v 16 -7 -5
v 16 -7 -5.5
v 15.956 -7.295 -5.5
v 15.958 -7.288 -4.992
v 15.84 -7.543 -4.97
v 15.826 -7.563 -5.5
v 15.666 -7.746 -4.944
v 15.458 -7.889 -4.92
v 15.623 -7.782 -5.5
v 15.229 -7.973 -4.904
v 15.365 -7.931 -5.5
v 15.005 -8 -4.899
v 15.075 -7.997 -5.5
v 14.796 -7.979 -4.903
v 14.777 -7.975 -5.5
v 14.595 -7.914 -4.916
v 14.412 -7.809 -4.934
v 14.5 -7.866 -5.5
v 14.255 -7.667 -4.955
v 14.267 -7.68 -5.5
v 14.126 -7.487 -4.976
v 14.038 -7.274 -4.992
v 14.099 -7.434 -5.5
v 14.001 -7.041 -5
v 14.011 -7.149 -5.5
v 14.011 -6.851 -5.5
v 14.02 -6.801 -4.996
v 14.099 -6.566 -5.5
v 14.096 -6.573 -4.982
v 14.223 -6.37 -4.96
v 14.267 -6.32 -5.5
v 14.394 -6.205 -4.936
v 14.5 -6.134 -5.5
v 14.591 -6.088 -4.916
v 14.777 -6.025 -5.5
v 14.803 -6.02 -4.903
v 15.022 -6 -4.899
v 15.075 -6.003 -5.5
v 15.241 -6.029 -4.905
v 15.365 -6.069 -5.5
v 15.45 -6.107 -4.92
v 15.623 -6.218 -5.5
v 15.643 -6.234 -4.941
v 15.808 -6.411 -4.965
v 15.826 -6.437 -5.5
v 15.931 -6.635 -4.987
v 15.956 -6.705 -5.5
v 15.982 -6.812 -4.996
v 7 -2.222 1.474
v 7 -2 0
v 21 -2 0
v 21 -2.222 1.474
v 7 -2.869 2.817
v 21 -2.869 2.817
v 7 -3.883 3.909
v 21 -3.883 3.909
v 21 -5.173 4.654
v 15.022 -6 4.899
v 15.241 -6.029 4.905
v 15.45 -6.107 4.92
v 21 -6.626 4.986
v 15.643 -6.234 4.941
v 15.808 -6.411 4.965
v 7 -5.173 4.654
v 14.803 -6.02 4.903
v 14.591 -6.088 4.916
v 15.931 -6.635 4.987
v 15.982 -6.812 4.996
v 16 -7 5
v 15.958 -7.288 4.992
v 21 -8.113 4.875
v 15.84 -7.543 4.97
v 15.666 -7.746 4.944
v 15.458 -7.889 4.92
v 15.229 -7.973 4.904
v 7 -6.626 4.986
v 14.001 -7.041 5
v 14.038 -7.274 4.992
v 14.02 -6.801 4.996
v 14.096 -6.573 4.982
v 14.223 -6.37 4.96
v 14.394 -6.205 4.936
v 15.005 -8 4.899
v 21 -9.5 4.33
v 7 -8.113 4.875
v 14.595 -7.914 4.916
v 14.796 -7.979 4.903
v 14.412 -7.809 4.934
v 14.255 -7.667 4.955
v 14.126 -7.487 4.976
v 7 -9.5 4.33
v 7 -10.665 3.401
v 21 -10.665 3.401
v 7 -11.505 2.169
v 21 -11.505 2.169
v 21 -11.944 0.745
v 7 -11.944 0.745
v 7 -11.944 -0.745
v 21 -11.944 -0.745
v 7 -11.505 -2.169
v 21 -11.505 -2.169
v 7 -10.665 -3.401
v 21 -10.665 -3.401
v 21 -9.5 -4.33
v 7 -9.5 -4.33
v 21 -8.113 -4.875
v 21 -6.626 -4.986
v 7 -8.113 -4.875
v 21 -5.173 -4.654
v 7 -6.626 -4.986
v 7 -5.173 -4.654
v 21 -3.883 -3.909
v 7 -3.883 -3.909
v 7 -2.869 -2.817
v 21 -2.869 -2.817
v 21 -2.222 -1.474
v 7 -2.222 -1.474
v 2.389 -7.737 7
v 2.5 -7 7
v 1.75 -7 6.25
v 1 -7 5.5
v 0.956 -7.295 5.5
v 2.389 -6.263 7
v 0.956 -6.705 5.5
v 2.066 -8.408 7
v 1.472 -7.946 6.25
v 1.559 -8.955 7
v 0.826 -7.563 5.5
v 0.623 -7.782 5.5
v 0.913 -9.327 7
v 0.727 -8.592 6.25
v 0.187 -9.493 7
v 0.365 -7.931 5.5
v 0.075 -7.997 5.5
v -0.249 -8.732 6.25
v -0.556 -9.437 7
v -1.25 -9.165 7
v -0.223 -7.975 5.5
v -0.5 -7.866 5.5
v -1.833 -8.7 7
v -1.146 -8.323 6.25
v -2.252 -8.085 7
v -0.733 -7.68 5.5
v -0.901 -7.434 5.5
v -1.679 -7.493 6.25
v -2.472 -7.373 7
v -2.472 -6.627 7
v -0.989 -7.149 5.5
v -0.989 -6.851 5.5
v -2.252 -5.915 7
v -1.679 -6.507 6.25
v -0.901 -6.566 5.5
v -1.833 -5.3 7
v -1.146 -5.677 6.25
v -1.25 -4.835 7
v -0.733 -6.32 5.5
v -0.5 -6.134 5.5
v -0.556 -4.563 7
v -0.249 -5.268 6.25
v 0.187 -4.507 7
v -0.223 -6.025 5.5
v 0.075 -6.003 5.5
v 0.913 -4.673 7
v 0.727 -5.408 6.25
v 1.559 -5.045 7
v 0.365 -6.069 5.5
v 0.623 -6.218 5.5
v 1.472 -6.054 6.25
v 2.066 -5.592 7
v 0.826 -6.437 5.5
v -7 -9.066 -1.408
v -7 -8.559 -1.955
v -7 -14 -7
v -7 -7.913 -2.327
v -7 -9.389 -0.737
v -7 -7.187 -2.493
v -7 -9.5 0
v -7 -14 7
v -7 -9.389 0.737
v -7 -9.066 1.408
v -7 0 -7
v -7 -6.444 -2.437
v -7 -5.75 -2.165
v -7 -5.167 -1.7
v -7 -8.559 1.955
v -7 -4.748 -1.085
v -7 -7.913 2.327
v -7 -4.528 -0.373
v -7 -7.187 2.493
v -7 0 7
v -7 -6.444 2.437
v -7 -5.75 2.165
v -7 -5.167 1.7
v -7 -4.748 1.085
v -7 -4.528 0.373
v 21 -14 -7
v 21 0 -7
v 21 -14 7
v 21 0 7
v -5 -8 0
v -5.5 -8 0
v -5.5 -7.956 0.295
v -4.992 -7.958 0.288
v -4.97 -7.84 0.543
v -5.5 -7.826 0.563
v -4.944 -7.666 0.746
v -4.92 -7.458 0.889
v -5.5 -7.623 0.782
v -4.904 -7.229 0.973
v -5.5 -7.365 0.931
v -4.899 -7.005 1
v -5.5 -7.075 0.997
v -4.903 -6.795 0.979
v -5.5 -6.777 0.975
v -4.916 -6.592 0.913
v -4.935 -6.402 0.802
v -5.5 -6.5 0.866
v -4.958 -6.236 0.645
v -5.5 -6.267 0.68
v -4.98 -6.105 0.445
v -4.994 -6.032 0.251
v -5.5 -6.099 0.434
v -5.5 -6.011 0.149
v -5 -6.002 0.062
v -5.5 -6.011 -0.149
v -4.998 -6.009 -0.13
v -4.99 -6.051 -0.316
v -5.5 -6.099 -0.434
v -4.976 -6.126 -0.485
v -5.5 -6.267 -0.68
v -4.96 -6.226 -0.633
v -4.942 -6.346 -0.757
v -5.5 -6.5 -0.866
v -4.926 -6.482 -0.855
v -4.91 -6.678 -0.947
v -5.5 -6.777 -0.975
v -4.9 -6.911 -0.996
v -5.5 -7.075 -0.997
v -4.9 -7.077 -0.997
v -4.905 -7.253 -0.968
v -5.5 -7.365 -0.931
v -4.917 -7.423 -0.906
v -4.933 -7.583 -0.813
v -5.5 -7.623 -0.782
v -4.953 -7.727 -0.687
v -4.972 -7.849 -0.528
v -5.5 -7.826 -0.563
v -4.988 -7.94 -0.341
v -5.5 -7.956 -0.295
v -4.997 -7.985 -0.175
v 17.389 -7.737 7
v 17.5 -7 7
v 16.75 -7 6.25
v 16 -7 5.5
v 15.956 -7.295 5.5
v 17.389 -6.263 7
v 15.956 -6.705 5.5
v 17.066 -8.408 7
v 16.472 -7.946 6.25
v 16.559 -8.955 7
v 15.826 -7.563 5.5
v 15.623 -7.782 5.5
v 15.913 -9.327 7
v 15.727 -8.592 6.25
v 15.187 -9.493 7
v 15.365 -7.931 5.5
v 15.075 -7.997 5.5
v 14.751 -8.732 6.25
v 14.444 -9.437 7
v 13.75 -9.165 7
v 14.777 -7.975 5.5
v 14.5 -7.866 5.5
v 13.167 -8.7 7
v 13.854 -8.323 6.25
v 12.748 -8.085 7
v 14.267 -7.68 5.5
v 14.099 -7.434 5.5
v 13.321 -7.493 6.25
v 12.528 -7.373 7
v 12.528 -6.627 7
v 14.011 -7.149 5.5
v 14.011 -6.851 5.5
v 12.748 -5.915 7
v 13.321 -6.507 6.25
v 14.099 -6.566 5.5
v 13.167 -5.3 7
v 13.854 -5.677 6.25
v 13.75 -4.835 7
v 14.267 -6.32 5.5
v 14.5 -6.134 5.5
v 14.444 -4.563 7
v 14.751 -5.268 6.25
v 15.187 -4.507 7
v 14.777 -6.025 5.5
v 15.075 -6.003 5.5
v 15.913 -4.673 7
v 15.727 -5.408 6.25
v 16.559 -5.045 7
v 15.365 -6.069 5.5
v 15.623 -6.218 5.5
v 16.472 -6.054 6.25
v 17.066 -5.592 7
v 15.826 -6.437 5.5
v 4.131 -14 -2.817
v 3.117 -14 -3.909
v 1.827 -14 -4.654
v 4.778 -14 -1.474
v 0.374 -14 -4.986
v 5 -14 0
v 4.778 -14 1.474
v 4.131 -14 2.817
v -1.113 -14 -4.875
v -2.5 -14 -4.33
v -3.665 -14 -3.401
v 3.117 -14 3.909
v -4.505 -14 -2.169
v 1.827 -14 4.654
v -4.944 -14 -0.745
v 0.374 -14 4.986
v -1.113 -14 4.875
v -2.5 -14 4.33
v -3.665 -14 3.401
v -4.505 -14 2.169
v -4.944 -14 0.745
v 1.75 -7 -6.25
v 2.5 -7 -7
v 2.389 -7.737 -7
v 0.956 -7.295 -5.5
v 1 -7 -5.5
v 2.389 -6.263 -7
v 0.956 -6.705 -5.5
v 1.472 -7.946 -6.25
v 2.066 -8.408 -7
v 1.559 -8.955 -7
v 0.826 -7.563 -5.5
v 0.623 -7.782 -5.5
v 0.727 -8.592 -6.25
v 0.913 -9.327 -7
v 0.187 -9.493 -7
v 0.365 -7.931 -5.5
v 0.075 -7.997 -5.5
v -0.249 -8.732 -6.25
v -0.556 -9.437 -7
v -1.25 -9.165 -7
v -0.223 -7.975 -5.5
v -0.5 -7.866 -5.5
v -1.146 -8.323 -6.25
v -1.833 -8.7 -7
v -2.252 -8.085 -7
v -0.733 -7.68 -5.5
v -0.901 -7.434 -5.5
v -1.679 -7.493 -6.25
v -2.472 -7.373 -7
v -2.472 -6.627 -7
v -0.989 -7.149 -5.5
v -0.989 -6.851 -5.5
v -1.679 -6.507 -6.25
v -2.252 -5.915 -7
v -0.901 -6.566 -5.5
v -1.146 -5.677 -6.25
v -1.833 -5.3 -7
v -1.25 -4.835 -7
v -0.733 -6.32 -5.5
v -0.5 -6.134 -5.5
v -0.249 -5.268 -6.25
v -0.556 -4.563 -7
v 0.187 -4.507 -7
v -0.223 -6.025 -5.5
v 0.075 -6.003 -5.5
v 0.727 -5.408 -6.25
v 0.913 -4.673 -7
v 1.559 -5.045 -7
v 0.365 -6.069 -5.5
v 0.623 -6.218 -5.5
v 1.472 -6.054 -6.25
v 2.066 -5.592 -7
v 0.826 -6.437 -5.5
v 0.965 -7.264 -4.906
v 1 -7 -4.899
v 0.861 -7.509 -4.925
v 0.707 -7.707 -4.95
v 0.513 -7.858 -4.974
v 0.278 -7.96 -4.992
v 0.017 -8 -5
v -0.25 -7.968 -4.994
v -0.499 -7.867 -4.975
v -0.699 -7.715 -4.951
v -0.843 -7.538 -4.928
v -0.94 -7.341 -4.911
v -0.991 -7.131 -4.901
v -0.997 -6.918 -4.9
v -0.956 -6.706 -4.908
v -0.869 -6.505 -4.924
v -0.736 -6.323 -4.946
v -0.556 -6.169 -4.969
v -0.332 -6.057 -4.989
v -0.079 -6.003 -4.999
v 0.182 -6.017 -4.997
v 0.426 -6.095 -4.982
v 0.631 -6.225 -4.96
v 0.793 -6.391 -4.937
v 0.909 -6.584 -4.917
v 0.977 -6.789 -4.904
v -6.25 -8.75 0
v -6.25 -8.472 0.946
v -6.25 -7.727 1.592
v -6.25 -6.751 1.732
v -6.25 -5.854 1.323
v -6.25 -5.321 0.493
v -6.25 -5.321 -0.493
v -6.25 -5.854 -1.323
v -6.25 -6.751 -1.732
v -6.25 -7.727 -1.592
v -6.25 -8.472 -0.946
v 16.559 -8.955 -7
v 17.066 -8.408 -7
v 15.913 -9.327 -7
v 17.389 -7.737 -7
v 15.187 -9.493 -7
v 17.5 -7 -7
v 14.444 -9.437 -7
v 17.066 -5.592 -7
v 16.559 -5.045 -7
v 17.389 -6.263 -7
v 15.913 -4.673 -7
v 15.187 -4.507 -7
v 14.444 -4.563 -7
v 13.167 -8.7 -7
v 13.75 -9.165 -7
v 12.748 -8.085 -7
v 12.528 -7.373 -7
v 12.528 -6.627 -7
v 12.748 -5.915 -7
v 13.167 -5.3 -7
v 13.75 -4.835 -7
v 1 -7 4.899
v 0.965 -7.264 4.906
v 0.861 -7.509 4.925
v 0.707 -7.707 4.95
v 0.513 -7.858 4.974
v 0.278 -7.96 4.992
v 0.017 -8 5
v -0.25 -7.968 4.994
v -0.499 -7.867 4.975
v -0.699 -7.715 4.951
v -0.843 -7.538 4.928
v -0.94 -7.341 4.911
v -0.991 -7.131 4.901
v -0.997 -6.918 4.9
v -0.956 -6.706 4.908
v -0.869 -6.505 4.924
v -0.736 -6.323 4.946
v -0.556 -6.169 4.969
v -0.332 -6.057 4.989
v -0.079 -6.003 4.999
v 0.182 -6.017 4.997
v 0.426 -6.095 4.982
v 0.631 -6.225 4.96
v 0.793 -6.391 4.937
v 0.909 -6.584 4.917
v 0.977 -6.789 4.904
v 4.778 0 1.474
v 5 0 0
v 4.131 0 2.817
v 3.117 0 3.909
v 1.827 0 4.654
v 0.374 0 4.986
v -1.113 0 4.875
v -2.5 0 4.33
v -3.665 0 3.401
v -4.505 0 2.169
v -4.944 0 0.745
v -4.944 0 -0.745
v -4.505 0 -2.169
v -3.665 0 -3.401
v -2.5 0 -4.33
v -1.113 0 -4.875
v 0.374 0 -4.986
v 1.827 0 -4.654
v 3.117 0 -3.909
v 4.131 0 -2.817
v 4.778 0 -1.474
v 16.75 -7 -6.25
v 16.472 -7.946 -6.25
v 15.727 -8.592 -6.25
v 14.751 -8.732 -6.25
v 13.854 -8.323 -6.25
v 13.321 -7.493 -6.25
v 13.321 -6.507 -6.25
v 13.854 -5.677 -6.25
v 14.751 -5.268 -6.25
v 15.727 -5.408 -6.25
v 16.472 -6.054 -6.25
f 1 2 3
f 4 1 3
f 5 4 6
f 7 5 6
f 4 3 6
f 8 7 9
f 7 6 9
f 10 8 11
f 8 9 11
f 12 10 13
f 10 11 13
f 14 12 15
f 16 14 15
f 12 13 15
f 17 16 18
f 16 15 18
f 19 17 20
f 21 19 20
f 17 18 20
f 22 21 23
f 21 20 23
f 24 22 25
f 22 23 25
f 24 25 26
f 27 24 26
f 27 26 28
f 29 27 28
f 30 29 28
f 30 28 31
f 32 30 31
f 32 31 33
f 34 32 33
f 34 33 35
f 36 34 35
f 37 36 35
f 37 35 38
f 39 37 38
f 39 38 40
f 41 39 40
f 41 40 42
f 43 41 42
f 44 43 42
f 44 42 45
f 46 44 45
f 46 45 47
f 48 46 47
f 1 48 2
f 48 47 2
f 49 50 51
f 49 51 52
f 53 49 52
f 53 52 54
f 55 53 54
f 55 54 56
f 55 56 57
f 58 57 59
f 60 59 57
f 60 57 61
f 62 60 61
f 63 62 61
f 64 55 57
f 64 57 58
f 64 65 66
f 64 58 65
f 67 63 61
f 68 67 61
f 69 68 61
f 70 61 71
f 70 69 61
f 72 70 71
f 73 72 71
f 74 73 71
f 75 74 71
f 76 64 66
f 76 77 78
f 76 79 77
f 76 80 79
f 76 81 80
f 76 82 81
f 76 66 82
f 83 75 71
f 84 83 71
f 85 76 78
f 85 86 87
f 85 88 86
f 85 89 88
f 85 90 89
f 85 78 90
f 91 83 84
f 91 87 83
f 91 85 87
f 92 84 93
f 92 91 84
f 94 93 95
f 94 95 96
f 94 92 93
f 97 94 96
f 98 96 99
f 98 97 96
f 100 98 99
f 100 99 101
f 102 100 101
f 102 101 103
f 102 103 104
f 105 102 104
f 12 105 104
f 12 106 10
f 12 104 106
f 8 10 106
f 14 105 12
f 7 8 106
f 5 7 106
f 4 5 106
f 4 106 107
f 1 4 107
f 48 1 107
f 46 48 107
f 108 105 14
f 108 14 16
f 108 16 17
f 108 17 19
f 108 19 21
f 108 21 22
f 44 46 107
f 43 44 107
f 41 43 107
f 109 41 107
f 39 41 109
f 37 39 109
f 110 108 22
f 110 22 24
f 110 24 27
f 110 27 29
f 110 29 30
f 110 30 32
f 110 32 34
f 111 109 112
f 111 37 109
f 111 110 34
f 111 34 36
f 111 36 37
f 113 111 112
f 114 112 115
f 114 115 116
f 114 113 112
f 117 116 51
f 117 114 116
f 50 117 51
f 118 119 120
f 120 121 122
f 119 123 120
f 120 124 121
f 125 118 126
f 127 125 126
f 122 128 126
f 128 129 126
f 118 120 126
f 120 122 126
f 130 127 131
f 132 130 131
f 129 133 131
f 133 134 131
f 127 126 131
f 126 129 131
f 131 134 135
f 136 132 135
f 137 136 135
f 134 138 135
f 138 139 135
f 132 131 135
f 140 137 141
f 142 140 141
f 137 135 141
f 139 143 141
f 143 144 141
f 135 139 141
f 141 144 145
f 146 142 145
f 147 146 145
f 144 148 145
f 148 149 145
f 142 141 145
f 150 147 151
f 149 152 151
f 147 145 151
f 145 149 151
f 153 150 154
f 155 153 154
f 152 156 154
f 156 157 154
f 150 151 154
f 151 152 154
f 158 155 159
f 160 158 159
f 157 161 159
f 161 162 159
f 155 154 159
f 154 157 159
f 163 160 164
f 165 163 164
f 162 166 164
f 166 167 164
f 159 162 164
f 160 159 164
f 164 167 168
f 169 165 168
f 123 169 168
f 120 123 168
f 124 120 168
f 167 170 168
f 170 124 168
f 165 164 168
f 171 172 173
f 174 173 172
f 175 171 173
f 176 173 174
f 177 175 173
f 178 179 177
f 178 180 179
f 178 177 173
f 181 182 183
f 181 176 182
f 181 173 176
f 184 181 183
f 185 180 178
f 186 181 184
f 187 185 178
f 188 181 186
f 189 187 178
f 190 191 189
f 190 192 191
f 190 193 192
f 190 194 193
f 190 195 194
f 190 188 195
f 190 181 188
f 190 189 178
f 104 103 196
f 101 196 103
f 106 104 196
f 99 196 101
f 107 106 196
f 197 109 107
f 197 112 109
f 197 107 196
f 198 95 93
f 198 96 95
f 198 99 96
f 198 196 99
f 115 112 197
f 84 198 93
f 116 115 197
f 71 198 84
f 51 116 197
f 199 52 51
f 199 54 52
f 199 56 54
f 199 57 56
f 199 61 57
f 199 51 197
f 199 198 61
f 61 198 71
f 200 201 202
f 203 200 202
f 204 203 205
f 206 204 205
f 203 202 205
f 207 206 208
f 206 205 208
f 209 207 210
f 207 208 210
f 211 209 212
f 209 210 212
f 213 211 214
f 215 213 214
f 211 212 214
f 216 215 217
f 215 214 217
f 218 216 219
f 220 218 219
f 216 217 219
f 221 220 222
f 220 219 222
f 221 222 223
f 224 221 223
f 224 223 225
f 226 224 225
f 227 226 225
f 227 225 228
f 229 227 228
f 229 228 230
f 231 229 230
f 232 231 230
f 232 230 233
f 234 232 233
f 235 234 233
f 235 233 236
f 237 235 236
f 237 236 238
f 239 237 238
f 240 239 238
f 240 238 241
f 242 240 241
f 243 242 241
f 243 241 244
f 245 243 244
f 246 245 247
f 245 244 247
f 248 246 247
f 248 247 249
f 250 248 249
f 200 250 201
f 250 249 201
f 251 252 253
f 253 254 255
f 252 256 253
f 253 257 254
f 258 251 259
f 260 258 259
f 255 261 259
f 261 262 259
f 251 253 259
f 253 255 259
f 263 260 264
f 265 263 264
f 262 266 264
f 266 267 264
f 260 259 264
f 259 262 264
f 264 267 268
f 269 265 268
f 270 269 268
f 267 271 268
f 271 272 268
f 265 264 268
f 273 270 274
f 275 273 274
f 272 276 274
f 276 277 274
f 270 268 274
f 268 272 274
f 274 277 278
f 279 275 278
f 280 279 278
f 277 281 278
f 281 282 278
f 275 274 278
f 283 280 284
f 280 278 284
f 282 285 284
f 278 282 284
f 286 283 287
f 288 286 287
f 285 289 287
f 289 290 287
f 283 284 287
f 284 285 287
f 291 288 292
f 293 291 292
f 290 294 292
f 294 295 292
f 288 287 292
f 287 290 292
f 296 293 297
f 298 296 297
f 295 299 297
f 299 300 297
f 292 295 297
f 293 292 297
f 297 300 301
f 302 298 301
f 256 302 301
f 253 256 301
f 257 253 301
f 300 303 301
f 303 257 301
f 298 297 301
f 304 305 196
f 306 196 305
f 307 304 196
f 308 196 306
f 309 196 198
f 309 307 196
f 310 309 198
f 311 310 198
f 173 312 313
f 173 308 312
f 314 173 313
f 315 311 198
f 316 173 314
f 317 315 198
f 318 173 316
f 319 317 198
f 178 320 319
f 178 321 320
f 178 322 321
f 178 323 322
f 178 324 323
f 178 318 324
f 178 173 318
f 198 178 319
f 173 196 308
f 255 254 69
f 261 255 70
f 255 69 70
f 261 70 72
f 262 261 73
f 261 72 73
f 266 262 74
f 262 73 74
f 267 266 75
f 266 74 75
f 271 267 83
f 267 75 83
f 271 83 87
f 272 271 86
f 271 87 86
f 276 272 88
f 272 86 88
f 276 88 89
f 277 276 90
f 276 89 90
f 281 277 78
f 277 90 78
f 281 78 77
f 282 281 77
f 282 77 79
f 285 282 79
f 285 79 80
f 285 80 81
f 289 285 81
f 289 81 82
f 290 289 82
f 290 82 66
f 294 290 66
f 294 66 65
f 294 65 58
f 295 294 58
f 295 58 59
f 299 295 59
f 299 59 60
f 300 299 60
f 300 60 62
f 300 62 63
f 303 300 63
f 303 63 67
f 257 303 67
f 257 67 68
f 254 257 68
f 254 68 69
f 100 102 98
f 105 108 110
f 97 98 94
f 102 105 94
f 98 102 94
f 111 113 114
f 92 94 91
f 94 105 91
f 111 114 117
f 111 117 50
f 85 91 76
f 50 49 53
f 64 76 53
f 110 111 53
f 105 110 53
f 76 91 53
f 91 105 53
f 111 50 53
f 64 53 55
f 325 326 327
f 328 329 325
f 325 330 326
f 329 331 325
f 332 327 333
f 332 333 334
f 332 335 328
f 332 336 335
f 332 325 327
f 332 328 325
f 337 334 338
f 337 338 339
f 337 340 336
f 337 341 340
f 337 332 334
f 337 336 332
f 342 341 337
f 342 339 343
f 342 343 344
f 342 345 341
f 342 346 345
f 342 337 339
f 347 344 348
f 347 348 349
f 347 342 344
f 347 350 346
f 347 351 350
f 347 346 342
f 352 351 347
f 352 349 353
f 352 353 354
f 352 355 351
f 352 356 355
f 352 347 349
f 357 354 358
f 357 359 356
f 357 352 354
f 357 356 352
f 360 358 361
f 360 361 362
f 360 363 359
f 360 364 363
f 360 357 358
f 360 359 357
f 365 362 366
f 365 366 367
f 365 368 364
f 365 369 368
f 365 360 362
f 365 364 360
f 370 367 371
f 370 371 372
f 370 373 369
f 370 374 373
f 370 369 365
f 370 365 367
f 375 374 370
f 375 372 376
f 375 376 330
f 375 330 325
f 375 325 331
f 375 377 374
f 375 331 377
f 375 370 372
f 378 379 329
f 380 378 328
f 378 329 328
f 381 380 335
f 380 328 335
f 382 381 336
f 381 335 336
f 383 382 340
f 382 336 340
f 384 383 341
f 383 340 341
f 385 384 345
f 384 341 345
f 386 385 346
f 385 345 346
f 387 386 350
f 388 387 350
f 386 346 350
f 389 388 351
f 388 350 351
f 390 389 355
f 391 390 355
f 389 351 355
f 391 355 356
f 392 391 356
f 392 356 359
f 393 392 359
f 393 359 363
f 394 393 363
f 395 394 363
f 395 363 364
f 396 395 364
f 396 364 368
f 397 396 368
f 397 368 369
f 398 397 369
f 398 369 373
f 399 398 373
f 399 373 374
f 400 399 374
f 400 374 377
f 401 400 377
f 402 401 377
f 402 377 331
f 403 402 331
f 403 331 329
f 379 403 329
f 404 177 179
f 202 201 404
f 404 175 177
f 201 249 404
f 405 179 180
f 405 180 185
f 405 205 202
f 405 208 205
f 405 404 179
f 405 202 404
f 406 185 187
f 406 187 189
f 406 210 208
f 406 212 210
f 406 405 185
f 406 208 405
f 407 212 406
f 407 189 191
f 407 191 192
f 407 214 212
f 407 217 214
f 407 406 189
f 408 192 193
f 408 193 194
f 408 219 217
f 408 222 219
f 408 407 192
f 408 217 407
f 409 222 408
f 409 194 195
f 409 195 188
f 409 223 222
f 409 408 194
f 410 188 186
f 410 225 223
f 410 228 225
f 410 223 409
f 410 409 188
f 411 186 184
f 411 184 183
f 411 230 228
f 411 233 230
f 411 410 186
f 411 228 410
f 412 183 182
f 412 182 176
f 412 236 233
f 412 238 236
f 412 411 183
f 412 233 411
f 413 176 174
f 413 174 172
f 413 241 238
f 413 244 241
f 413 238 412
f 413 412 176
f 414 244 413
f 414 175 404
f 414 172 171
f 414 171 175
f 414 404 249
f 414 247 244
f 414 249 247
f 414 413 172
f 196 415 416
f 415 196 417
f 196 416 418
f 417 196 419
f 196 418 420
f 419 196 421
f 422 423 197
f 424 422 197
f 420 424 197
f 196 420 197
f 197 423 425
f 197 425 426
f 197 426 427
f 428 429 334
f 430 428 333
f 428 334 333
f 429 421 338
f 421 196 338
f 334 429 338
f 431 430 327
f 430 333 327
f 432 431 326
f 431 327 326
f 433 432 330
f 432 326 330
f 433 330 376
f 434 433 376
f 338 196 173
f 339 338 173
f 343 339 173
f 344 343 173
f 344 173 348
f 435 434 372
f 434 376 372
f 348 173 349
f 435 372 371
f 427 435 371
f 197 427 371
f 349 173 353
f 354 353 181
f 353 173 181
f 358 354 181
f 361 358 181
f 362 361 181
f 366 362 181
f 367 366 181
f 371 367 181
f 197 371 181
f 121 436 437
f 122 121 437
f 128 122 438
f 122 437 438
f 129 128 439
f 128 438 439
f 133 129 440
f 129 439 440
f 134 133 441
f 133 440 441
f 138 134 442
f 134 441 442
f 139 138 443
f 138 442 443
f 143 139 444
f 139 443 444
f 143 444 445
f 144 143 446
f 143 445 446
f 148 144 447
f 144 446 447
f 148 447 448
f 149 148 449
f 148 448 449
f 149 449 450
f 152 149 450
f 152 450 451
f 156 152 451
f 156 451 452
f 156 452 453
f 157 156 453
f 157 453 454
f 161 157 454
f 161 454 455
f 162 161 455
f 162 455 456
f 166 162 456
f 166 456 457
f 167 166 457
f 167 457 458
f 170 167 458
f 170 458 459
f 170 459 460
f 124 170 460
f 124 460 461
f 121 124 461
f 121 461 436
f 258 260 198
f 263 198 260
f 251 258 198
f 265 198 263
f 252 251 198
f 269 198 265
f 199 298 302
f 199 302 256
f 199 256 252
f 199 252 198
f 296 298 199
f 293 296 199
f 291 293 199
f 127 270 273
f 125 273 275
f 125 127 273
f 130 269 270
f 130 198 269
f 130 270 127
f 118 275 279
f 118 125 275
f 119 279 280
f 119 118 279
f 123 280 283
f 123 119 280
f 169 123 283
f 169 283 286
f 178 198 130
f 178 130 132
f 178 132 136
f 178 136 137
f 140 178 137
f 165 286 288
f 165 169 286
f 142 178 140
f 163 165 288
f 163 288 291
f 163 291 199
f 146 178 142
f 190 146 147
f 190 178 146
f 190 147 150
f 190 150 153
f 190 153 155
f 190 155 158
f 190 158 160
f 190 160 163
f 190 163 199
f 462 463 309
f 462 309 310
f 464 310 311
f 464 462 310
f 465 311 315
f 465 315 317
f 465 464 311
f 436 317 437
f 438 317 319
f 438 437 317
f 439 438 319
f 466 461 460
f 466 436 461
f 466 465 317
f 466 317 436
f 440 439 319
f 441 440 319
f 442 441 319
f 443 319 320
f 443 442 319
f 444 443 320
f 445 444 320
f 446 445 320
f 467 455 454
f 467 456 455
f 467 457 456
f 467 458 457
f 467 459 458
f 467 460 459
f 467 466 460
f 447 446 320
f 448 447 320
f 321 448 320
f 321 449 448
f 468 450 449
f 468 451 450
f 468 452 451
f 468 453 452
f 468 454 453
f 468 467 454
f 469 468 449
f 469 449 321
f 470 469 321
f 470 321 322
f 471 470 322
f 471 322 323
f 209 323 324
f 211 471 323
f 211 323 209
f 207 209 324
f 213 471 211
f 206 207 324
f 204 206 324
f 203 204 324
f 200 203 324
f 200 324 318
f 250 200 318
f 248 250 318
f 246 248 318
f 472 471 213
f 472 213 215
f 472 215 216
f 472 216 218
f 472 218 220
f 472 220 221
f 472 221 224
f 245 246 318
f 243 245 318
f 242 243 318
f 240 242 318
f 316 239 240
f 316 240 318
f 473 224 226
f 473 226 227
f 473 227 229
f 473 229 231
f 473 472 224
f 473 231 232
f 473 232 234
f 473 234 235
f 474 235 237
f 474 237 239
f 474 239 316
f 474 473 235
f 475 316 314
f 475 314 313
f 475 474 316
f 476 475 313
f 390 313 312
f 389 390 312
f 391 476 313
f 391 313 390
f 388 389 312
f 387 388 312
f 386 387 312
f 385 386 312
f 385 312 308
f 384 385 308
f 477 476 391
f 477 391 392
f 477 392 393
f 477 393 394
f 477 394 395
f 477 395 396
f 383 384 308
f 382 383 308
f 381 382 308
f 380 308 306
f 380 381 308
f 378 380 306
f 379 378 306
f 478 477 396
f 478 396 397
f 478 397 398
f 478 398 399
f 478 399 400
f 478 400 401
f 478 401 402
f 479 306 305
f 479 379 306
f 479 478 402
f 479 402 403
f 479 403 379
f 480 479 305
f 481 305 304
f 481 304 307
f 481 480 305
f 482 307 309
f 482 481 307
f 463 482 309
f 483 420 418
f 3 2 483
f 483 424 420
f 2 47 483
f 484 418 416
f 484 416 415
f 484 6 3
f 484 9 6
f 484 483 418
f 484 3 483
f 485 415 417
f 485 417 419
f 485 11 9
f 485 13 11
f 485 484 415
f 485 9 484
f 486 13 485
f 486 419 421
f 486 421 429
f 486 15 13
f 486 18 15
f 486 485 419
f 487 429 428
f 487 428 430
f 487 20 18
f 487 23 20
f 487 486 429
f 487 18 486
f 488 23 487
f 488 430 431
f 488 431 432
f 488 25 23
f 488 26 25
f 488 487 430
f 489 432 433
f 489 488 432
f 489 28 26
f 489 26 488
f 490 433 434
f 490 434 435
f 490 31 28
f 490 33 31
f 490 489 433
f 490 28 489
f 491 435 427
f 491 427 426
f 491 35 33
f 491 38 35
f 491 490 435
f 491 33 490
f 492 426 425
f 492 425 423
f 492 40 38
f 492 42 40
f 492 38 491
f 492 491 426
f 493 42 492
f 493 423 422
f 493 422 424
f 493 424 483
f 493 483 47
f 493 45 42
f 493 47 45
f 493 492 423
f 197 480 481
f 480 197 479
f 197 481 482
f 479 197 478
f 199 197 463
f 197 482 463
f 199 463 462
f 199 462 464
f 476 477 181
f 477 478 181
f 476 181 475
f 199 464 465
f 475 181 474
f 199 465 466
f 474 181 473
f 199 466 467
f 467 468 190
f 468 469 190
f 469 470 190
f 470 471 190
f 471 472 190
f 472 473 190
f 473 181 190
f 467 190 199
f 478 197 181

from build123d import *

# Parameters (mm, degrees)
F2_W      = 14
F2_H      = 14
F2_R      = 5
F3_DEPTH  = 14
F4_ANGLE  = -90
F6_R      = 1
F8_DEPTH  = 14.001
F7_R      = 1
F9_DEPTH  = 2.1020206144
F10_SIZE2 = 1.5
F10_SIZE  = 1.5


with BuildPart() as f3:
    # F2 (on Front) → F3 (new body)
    with BuildSketch(Plane.XZ):
        Rectangle(F2_W, F2_H)
        Circle(F2_R, mode=Mode.SUBTRACT)
    extrude(amount=F3_DEPTH)


with BuildPart() as f4_1:
    # F4: copy of F3
    add(f3.part.rotate(Axis((7, 0, 0), (0, 0, -1)), F4_ANGLE))


with BuildPart() as f3_1:
    add(f3.part)

    # F5: union F4_1
    add(f4_1.part)

    # F6 (on face) → F8 (cut, through all)
    with BuildSketch(Plane(origin=(0, 0, -7), x_dir=(1, 0, 0), z_dir=(0, 0, -1))):
        with Locations((0, 7)):
            Circle(F6_R)
        with Locations((15, 7)):
            Circle(F6_R)
    extrude(amount=-F8_DEPTH, mode=Mode.SUBTRACT)

    # F7 (on face) → F9 (cut, through all)
    with BuildSketch(Plane(origin=(-7, 0, 0), x_dir=(0, -1, 0), z_dir=(-1, 0, 0))):
        with Locations((7, 0)):
            Circle(F7_R)
    extrude(amount=-F9_DEPTH, mode=Mode.SUBTRACT)

    # F10
    f10_edges = [f3_1.edges().sort_by_distance(p)[0] for p in [
        (-1, -7, -7),
        (14, -7, -7),
        (-1, -7, 7),
        (14, -7, 7),
        (-7, -6, 0),
    ]]
    chamfer(f10_edges, length=F10_SIZE, length2=F10_SIZE2)


solid = f3_1.part
